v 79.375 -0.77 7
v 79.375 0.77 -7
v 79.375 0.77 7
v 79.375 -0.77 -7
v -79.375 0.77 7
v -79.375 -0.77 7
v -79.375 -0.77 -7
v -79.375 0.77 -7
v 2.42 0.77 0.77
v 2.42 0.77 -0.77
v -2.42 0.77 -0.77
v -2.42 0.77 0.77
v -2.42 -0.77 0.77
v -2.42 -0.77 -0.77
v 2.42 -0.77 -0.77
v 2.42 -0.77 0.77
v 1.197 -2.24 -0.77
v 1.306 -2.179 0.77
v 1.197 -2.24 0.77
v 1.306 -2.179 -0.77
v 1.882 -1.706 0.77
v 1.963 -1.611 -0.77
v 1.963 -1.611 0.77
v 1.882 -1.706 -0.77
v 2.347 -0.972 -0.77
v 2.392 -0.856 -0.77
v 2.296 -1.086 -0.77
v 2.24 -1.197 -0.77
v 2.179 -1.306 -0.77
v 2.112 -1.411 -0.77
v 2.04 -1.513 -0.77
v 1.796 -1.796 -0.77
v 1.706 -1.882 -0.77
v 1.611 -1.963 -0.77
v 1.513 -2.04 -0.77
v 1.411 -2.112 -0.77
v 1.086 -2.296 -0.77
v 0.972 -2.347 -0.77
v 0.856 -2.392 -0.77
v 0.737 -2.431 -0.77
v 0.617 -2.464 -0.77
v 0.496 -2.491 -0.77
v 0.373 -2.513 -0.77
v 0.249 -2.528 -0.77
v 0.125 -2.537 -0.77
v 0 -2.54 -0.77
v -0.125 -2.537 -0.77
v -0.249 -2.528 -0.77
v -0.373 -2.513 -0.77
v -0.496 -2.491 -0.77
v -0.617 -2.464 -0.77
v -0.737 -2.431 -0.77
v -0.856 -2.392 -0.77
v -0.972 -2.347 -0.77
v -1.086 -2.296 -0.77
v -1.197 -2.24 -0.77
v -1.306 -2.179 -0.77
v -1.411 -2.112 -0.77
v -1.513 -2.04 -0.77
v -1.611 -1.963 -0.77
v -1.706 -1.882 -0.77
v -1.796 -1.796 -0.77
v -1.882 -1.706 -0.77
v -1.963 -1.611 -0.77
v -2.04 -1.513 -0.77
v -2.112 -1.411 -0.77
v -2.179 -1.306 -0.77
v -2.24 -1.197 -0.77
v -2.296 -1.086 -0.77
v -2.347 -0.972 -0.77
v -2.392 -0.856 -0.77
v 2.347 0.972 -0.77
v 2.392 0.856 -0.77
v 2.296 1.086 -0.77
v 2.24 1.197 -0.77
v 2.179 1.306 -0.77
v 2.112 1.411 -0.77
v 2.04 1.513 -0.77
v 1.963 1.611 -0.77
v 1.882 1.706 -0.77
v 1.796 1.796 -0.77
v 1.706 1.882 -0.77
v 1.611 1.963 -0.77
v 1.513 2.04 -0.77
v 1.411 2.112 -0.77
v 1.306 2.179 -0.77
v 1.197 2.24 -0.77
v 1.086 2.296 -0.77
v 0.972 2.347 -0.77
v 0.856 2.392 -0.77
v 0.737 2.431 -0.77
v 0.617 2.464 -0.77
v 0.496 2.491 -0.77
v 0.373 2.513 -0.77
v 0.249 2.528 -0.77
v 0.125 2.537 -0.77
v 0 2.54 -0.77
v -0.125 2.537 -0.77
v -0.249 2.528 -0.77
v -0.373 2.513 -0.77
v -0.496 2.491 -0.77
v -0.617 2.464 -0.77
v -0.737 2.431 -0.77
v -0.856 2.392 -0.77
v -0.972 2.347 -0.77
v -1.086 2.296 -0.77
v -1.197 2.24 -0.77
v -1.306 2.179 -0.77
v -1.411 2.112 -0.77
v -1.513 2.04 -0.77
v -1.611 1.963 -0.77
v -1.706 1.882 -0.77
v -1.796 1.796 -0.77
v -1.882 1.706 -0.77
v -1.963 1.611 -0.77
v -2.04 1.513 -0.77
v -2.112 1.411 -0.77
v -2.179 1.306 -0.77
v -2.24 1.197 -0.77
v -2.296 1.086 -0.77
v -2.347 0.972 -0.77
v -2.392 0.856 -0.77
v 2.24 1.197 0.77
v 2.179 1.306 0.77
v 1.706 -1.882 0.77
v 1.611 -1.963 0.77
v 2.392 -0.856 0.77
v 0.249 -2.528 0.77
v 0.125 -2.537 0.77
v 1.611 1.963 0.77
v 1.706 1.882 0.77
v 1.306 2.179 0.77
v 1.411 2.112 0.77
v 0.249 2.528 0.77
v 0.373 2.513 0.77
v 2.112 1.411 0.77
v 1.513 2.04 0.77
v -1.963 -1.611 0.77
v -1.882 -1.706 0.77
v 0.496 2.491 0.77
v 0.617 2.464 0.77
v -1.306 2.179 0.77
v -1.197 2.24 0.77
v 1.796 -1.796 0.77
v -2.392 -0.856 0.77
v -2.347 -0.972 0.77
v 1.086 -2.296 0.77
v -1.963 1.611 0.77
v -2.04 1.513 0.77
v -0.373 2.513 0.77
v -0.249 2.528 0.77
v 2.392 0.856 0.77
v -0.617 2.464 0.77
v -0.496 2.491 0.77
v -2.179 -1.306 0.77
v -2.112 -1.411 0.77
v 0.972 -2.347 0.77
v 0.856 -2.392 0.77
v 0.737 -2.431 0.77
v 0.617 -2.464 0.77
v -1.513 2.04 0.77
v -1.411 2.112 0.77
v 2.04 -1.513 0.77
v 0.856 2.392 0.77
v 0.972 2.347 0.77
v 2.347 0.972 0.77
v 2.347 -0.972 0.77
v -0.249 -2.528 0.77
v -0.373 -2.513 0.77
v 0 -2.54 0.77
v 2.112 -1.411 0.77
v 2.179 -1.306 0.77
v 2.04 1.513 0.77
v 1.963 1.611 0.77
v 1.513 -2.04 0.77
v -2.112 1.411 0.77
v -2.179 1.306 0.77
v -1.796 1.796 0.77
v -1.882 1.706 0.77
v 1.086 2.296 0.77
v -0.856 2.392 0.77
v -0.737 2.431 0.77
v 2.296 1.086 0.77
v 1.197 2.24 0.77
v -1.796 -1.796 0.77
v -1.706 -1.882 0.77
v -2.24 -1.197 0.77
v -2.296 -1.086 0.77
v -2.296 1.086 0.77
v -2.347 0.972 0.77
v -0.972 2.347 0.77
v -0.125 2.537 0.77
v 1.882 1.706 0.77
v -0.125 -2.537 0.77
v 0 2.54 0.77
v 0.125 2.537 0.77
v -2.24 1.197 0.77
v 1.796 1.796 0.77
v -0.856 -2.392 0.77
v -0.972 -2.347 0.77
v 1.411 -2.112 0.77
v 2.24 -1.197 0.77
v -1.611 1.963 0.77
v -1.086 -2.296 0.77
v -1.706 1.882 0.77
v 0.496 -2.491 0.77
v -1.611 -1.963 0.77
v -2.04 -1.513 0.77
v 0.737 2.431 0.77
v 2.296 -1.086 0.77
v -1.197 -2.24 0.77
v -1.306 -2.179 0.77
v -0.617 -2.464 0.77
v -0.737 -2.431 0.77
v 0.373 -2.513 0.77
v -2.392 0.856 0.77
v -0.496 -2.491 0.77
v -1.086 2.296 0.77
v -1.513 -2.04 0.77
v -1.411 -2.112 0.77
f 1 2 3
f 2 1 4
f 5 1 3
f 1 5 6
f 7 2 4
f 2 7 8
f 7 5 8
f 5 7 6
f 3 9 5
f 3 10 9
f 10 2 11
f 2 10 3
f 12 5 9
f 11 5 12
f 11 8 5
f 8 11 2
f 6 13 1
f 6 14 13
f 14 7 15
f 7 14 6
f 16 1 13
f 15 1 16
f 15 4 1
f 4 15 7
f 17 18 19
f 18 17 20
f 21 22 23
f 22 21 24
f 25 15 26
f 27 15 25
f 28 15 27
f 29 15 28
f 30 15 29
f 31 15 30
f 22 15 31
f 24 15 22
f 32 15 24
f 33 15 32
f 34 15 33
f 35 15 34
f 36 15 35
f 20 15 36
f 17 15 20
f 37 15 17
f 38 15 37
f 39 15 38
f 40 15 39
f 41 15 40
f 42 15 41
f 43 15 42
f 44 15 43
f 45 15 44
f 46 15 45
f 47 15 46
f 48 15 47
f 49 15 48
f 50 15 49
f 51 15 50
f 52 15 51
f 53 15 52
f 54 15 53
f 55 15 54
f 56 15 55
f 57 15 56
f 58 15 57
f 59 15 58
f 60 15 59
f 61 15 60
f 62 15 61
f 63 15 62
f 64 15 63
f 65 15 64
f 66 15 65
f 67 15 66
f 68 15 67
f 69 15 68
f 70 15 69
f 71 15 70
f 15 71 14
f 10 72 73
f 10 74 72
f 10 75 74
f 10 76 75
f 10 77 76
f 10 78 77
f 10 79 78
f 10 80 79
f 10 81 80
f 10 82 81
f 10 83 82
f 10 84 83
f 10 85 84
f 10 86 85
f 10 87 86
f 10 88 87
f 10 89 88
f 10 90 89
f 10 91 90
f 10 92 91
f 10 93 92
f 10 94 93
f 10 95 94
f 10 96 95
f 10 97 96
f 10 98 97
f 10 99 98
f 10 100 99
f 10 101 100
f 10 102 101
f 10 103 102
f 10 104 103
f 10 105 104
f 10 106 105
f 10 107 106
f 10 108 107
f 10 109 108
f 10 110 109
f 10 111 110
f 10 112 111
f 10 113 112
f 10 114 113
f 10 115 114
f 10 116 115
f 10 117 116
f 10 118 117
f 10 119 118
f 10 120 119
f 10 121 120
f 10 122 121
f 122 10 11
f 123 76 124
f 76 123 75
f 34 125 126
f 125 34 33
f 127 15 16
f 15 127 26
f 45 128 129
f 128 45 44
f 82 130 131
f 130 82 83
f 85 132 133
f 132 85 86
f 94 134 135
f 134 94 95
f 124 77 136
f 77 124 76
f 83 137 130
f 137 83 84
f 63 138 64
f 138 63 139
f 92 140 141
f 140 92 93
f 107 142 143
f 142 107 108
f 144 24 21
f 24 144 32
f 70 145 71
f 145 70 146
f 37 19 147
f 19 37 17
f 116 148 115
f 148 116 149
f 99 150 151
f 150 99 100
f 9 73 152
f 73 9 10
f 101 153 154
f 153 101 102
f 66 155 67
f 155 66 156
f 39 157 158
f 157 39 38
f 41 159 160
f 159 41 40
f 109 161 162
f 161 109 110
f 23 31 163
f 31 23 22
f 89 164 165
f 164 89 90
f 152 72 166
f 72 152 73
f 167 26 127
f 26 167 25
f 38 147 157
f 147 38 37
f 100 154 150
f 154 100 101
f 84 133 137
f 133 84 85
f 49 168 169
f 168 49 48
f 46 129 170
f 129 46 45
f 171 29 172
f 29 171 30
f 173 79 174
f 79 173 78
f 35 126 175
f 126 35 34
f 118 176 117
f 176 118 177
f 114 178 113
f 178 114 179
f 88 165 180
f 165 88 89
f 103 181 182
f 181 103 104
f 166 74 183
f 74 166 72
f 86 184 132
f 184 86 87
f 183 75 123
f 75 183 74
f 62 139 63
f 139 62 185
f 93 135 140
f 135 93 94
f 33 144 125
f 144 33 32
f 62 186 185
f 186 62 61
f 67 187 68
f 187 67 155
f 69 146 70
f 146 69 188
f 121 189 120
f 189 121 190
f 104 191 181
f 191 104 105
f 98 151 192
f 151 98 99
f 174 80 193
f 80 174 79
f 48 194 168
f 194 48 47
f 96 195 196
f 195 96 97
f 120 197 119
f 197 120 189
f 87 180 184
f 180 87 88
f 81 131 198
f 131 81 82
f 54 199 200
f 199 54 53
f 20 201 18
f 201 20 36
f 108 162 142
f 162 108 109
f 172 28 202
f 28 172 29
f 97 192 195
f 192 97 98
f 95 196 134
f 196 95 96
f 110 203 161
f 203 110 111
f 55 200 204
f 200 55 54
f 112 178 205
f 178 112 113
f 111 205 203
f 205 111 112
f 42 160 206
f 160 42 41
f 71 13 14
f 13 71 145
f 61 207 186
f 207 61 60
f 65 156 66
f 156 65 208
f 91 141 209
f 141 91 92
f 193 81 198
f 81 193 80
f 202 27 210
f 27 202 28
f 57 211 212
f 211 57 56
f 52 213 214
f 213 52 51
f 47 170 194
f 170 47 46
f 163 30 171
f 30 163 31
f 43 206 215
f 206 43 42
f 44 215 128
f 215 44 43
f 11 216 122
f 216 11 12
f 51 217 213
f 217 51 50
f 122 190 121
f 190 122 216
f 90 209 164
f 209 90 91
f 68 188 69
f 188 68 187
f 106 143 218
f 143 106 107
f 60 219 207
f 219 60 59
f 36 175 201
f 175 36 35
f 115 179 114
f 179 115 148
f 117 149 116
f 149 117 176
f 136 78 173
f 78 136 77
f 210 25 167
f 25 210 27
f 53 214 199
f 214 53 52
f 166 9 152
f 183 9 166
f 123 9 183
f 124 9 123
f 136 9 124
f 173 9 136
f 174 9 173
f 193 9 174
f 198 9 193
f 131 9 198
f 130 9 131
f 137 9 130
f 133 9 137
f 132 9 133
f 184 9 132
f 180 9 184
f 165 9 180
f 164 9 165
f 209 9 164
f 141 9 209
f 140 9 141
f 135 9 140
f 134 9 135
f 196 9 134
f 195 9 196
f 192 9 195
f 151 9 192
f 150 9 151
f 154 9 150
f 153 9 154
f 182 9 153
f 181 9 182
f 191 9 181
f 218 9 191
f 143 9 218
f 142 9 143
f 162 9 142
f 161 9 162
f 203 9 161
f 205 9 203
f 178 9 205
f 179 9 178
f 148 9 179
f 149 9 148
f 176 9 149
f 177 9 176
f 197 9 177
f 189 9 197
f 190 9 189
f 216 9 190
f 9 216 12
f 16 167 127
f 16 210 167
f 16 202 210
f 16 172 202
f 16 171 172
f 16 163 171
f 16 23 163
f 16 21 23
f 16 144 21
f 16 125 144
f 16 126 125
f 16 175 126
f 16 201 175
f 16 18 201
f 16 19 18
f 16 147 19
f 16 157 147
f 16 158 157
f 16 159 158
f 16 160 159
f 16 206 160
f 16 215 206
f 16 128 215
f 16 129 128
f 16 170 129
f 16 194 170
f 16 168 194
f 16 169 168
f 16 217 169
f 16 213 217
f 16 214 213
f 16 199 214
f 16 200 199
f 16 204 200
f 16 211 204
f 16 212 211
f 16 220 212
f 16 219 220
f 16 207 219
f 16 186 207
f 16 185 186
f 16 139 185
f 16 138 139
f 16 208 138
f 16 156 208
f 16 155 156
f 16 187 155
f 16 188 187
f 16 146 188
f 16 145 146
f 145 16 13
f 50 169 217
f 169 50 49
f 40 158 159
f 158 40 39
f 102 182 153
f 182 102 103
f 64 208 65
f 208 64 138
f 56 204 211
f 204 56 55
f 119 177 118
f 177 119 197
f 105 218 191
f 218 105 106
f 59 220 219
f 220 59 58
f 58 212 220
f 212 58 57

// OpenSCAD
// file: H8_parameters.scad
// Heathkit H8 Computer Enclosure - Parameters and Functions
// Copyright 2024 Craig Bladow
// Released under MIT license:
//          https://github.com/CraigBladow/Heathkit-H8-Enclosure/blob/main/LICENSE

// Common Constants
left = 1.0;
right = -1.0;

//All measurements in inches converted to mm or mm directly.
function mm(x) = x * 25.4;  //convert inches to mm

// Case Dimension
CaseWidth = mm(16.0);

// Front/Side Panel PCB Dimensions
FP_PCB_Length = mm(14.75);
FP_PCB_Height = mm(5.75);
SidePlanePCBHeight = mm(5.5);
SidePlanePCBTopEdgeLength = mm(11.125);
SidePlanePCBBottomEdgeLength = mm(14.25);// wrong! old version: mm(13.25);
SidePlanePCBFrontEdgeLength = mm(6.52);// wrong! old version: mm(6.25);
PCB_Thickness = 1.6; //mm
CardPCB_Length = mm(12.0);
CardPCB_Height = mm(6.0);
CardToSidePlaneGap = mm(3.0/16.0);
SidePlanePrimeSlopeAngle = atan((SidePlanePCBBottomEdgeLength - SidePlanePCBTopEdgeLength)/SidePlanePCBHeight);
echo(SidePlanePrimeSlopeAngle = SidePlanePrimeSlopeAngle);

// Side Panel PCB mount locations
SP_MountVerticalInset = mm(7.0/16.0);
SP_MountTopBackHorizInset = mm(3.0/4.0);
SP_MountBottomBackHorizInset = mm(3.0+9.0/16.0);
SP_MountHolesOffset = mm(4.0+5.0/8.0);
SP_PCB_InsetFromCaseBack = mm(1.0); // A big guess at the moment... :)
SP_PCB_HeightFromCaseBottom = mm(0);

SP_PCB_StandOffHeight = 6.5; //mm


// Side Panel overall dimensions in inches.
PanelHeight = mm(6.25); //NCCP 6.1375
PanelCornerRadius = mm(0.125);
PanelOverallLength = mm(17);
PanelFrontBottomRecessHeight = mm(0.5);
PanelFrontBottomRecessLength = mm(0.5);
PanelTopLength = mm(14.0);
PanelThickness = mm(0.5);
PanelSocketsNumber = 6;

//Find the angle for to base front panel ledge and bracket on
// Todo - use side panel dimensions,also adjusting the Panel dimensions currently used.
PrimeSlopeAngle = atan((PanelOverallLength-PanelTopLength)/(PanelHeight-PanelFrontBottomRecessHeight));
echo(PrimeSlopeAngle = PrimeSlopeAngle);
// Front Panel Ledge
FP_LedgeLength = mm(4);
FP_LedgeWidth = mm(0.08);
FP_LedgeHeight = mm(0.121);
FP_LedgeAngle = 90 - PrimeSlopeAngle; //58.15; //degrees
FP_LedgeRecess = mm(2.5);
FP_LedgeOffset = mm(0.0);

// Lid support
LedgeRecess = mm(0.27);
LedgeOffset = mm(1.875);
LedgeWidth = mm(0.05);
LedgeHeight = mm(0.125);
LedgeLength = mm(10.7);

// Side Panel Base Plate and Back Panel Recess , how much the side panel extends below the bottom of the base plate
BasePlateRecess = mm(0.125);
BackPanelRecess = BasePlateRecess;

// Base Plate dimensions
BasePlateWidth = CaseWidth - 2 * PanelThickness;
BasePlateLength = mm(15); //Not verified
BasePlateHeight = 9.0; //mm Baltic Birch Plywood
BasePlateOffset = -(PanelOverallLength-BasePlateLength)/2+BackPanelRecess; 

// Back Support Dimensions, 2 instances are needed
BackSupportThickness = BasePlateHeight;
BackSupportHeight = mm(1.0);

// Fasteners
Screw_Hole_Tol = 0.1; // mm
Screw_6_32x1_4_dia = mm(0.138) + Screw_Hole_Tol;
Screw_6_32x1_4_len = mm(0.25) + Screw_Hole_Tol;

Insert_6_32_hole_depth = mm(0.29) + mm(0.005);
Insert_6_32_opening_dia = mm(0.206) + mm(0.002);
Insert_6_32_bottom_dia = mm(0.185) + mm(0.002);
Insert_6_32_taper_length = mm(0.150);


// SidePanel Pin
SidePinLength = mm(1.6);
SidePinXY = mm(0.2);
SidePinTol = mm(0.01);
SidePinSnapGapWidth = SidePinXY * 0.4;
SidePinSnapGapLength = SidePinXY * 1.2;
SidePinSnapBumpHeight = (SidePinXY-SidePinSnapGapWidth) / 3;
SidePinSnapBumpLength = (SidePinXY-SidePinSnapGapWidth) / 2;

// Card and Top Bracket
CardBracketWidth = 14; // mm
CardBracketThickness = 1.54; //mm
CardBracketLength = mm(6.25);
CardBrackeTabLength = mm(0.625);
CardBracketCardHoleDia = 3.6; //mm
CardBracketCardHoleSpacing = mm(4.0);
CardBracketTabCornerRadius = mm(0.1);


// Base Plate Mounting Rails
BaseMountThickness = mm(0.2);
BaseMountWidth = BasePlateLength-(BackSupportThickness);
BaseMountLength = mm(0.6);
BaseMountFilletRadius = mm(0.2);

//Back Panel
BackPanelHeight = PanelHeight-LedgeRecess-BasePlateHeight-BasePlateRecess;
BackPanelMountLength = BackPanelHeight;
BackPanelRailsOffset = (LedgeRecess-BasePlateHeight-BasePlateRecess)/2;

BackPanelThickness = BasePlateHeight;
BackPanelBoltInset = BaseMountLength/2; 

// FrontPanel Support Bracket
// Front PCB support Bracket
FPB_LengthLong = mm(4.5);
FPB_LengthLongWidth = mm(0.5);
FPB_LengthShortWidth = mm(0.5+1/6);
FPB_LengthShort = mm(3.75);
FPB_Thickness = mm(1/16);
FPB_HoleSpacing = mm(3.0);
FPB_HoleDiameter = mm(0.165);
FPB_HoleOffset = FPB_LengthShortWidth/2 - (mm(0.1)+FPB_HoleDiameter/2);

// No. 8 bolt carve out
WasherRecessDiameterBottomNo8 = mm(3/8)+mm(1/16); // extra 1/16 cleareance
WasherRecessDiameterTopNo8 = mm(3/8)+mm(1/8); // slighty conical clearance
WasherRecessHeightNo8 = mm(1/32)*3; //extra height to clear flillet
WasherEmbossDepth = 0.8; // mm
BoltHoleDiameterNo8 = mm(11/64);
BoltLength3_4 = mm(3/4);

BaseFootTopDiameter = mm(0.75);
BaseFootBottomDiameter = mm(0.5);
BaseFootHeight = mm(0.5);

//echo(BackPanelRecess = BackPanelRecess);
//echo(BackPanelThickness = BackPanelThickness);
//echo(BaseMountThickness = BaseMountThickness);
//echo(PanelOverallLength = PanelOverallLength);
//echo(BaseMountWidth = BaseMountWidth);
//echo(BasePlateLength = BasePlateLength);
//echo(WasherRecessDiameterTopNo8 = WasherRecessDiameterTopNo8);
//echo(BoltHoleDiameterNo8  = BoltHoleDiameterNo8 );
// main file
// Heathkit H8 Computer Enclosure - Card and Top Bracket
// Copyright 2024 Craig Bladow
// Released under MIT license:
//          https://github.com/CraigBladow/Heathkit-H8-Enclosure/blob/main/LICENSE

include <H8_parameters.scad>

// Card and Top Bracket
CardBracketWidth = 14; // mm
CardBracketThickness = 1.54; //mm
CardBracketLength = mm(6.25);
CardBrackeTabLength = mm(0.625);
CardBracketCardHoleDia = 3.6; //mm
CardBracketCardHoleSpacing = mm(4.0);
CardBracketTabCornerRadius = mm(0.1);

module CardBracketSpan()
{
    cube([CardBracketLength,CardBracketThickness,CardBracketWidth],center=true
    );
}

module CardBracketTab()
{
    union()
    {
        cylinder(h=CardBracketThickness,r=CardBracketTabCornerRadius,center=true);
    }
}
$fn=128;
CardBracketSpan();
color("lime")CardBracketTab();
